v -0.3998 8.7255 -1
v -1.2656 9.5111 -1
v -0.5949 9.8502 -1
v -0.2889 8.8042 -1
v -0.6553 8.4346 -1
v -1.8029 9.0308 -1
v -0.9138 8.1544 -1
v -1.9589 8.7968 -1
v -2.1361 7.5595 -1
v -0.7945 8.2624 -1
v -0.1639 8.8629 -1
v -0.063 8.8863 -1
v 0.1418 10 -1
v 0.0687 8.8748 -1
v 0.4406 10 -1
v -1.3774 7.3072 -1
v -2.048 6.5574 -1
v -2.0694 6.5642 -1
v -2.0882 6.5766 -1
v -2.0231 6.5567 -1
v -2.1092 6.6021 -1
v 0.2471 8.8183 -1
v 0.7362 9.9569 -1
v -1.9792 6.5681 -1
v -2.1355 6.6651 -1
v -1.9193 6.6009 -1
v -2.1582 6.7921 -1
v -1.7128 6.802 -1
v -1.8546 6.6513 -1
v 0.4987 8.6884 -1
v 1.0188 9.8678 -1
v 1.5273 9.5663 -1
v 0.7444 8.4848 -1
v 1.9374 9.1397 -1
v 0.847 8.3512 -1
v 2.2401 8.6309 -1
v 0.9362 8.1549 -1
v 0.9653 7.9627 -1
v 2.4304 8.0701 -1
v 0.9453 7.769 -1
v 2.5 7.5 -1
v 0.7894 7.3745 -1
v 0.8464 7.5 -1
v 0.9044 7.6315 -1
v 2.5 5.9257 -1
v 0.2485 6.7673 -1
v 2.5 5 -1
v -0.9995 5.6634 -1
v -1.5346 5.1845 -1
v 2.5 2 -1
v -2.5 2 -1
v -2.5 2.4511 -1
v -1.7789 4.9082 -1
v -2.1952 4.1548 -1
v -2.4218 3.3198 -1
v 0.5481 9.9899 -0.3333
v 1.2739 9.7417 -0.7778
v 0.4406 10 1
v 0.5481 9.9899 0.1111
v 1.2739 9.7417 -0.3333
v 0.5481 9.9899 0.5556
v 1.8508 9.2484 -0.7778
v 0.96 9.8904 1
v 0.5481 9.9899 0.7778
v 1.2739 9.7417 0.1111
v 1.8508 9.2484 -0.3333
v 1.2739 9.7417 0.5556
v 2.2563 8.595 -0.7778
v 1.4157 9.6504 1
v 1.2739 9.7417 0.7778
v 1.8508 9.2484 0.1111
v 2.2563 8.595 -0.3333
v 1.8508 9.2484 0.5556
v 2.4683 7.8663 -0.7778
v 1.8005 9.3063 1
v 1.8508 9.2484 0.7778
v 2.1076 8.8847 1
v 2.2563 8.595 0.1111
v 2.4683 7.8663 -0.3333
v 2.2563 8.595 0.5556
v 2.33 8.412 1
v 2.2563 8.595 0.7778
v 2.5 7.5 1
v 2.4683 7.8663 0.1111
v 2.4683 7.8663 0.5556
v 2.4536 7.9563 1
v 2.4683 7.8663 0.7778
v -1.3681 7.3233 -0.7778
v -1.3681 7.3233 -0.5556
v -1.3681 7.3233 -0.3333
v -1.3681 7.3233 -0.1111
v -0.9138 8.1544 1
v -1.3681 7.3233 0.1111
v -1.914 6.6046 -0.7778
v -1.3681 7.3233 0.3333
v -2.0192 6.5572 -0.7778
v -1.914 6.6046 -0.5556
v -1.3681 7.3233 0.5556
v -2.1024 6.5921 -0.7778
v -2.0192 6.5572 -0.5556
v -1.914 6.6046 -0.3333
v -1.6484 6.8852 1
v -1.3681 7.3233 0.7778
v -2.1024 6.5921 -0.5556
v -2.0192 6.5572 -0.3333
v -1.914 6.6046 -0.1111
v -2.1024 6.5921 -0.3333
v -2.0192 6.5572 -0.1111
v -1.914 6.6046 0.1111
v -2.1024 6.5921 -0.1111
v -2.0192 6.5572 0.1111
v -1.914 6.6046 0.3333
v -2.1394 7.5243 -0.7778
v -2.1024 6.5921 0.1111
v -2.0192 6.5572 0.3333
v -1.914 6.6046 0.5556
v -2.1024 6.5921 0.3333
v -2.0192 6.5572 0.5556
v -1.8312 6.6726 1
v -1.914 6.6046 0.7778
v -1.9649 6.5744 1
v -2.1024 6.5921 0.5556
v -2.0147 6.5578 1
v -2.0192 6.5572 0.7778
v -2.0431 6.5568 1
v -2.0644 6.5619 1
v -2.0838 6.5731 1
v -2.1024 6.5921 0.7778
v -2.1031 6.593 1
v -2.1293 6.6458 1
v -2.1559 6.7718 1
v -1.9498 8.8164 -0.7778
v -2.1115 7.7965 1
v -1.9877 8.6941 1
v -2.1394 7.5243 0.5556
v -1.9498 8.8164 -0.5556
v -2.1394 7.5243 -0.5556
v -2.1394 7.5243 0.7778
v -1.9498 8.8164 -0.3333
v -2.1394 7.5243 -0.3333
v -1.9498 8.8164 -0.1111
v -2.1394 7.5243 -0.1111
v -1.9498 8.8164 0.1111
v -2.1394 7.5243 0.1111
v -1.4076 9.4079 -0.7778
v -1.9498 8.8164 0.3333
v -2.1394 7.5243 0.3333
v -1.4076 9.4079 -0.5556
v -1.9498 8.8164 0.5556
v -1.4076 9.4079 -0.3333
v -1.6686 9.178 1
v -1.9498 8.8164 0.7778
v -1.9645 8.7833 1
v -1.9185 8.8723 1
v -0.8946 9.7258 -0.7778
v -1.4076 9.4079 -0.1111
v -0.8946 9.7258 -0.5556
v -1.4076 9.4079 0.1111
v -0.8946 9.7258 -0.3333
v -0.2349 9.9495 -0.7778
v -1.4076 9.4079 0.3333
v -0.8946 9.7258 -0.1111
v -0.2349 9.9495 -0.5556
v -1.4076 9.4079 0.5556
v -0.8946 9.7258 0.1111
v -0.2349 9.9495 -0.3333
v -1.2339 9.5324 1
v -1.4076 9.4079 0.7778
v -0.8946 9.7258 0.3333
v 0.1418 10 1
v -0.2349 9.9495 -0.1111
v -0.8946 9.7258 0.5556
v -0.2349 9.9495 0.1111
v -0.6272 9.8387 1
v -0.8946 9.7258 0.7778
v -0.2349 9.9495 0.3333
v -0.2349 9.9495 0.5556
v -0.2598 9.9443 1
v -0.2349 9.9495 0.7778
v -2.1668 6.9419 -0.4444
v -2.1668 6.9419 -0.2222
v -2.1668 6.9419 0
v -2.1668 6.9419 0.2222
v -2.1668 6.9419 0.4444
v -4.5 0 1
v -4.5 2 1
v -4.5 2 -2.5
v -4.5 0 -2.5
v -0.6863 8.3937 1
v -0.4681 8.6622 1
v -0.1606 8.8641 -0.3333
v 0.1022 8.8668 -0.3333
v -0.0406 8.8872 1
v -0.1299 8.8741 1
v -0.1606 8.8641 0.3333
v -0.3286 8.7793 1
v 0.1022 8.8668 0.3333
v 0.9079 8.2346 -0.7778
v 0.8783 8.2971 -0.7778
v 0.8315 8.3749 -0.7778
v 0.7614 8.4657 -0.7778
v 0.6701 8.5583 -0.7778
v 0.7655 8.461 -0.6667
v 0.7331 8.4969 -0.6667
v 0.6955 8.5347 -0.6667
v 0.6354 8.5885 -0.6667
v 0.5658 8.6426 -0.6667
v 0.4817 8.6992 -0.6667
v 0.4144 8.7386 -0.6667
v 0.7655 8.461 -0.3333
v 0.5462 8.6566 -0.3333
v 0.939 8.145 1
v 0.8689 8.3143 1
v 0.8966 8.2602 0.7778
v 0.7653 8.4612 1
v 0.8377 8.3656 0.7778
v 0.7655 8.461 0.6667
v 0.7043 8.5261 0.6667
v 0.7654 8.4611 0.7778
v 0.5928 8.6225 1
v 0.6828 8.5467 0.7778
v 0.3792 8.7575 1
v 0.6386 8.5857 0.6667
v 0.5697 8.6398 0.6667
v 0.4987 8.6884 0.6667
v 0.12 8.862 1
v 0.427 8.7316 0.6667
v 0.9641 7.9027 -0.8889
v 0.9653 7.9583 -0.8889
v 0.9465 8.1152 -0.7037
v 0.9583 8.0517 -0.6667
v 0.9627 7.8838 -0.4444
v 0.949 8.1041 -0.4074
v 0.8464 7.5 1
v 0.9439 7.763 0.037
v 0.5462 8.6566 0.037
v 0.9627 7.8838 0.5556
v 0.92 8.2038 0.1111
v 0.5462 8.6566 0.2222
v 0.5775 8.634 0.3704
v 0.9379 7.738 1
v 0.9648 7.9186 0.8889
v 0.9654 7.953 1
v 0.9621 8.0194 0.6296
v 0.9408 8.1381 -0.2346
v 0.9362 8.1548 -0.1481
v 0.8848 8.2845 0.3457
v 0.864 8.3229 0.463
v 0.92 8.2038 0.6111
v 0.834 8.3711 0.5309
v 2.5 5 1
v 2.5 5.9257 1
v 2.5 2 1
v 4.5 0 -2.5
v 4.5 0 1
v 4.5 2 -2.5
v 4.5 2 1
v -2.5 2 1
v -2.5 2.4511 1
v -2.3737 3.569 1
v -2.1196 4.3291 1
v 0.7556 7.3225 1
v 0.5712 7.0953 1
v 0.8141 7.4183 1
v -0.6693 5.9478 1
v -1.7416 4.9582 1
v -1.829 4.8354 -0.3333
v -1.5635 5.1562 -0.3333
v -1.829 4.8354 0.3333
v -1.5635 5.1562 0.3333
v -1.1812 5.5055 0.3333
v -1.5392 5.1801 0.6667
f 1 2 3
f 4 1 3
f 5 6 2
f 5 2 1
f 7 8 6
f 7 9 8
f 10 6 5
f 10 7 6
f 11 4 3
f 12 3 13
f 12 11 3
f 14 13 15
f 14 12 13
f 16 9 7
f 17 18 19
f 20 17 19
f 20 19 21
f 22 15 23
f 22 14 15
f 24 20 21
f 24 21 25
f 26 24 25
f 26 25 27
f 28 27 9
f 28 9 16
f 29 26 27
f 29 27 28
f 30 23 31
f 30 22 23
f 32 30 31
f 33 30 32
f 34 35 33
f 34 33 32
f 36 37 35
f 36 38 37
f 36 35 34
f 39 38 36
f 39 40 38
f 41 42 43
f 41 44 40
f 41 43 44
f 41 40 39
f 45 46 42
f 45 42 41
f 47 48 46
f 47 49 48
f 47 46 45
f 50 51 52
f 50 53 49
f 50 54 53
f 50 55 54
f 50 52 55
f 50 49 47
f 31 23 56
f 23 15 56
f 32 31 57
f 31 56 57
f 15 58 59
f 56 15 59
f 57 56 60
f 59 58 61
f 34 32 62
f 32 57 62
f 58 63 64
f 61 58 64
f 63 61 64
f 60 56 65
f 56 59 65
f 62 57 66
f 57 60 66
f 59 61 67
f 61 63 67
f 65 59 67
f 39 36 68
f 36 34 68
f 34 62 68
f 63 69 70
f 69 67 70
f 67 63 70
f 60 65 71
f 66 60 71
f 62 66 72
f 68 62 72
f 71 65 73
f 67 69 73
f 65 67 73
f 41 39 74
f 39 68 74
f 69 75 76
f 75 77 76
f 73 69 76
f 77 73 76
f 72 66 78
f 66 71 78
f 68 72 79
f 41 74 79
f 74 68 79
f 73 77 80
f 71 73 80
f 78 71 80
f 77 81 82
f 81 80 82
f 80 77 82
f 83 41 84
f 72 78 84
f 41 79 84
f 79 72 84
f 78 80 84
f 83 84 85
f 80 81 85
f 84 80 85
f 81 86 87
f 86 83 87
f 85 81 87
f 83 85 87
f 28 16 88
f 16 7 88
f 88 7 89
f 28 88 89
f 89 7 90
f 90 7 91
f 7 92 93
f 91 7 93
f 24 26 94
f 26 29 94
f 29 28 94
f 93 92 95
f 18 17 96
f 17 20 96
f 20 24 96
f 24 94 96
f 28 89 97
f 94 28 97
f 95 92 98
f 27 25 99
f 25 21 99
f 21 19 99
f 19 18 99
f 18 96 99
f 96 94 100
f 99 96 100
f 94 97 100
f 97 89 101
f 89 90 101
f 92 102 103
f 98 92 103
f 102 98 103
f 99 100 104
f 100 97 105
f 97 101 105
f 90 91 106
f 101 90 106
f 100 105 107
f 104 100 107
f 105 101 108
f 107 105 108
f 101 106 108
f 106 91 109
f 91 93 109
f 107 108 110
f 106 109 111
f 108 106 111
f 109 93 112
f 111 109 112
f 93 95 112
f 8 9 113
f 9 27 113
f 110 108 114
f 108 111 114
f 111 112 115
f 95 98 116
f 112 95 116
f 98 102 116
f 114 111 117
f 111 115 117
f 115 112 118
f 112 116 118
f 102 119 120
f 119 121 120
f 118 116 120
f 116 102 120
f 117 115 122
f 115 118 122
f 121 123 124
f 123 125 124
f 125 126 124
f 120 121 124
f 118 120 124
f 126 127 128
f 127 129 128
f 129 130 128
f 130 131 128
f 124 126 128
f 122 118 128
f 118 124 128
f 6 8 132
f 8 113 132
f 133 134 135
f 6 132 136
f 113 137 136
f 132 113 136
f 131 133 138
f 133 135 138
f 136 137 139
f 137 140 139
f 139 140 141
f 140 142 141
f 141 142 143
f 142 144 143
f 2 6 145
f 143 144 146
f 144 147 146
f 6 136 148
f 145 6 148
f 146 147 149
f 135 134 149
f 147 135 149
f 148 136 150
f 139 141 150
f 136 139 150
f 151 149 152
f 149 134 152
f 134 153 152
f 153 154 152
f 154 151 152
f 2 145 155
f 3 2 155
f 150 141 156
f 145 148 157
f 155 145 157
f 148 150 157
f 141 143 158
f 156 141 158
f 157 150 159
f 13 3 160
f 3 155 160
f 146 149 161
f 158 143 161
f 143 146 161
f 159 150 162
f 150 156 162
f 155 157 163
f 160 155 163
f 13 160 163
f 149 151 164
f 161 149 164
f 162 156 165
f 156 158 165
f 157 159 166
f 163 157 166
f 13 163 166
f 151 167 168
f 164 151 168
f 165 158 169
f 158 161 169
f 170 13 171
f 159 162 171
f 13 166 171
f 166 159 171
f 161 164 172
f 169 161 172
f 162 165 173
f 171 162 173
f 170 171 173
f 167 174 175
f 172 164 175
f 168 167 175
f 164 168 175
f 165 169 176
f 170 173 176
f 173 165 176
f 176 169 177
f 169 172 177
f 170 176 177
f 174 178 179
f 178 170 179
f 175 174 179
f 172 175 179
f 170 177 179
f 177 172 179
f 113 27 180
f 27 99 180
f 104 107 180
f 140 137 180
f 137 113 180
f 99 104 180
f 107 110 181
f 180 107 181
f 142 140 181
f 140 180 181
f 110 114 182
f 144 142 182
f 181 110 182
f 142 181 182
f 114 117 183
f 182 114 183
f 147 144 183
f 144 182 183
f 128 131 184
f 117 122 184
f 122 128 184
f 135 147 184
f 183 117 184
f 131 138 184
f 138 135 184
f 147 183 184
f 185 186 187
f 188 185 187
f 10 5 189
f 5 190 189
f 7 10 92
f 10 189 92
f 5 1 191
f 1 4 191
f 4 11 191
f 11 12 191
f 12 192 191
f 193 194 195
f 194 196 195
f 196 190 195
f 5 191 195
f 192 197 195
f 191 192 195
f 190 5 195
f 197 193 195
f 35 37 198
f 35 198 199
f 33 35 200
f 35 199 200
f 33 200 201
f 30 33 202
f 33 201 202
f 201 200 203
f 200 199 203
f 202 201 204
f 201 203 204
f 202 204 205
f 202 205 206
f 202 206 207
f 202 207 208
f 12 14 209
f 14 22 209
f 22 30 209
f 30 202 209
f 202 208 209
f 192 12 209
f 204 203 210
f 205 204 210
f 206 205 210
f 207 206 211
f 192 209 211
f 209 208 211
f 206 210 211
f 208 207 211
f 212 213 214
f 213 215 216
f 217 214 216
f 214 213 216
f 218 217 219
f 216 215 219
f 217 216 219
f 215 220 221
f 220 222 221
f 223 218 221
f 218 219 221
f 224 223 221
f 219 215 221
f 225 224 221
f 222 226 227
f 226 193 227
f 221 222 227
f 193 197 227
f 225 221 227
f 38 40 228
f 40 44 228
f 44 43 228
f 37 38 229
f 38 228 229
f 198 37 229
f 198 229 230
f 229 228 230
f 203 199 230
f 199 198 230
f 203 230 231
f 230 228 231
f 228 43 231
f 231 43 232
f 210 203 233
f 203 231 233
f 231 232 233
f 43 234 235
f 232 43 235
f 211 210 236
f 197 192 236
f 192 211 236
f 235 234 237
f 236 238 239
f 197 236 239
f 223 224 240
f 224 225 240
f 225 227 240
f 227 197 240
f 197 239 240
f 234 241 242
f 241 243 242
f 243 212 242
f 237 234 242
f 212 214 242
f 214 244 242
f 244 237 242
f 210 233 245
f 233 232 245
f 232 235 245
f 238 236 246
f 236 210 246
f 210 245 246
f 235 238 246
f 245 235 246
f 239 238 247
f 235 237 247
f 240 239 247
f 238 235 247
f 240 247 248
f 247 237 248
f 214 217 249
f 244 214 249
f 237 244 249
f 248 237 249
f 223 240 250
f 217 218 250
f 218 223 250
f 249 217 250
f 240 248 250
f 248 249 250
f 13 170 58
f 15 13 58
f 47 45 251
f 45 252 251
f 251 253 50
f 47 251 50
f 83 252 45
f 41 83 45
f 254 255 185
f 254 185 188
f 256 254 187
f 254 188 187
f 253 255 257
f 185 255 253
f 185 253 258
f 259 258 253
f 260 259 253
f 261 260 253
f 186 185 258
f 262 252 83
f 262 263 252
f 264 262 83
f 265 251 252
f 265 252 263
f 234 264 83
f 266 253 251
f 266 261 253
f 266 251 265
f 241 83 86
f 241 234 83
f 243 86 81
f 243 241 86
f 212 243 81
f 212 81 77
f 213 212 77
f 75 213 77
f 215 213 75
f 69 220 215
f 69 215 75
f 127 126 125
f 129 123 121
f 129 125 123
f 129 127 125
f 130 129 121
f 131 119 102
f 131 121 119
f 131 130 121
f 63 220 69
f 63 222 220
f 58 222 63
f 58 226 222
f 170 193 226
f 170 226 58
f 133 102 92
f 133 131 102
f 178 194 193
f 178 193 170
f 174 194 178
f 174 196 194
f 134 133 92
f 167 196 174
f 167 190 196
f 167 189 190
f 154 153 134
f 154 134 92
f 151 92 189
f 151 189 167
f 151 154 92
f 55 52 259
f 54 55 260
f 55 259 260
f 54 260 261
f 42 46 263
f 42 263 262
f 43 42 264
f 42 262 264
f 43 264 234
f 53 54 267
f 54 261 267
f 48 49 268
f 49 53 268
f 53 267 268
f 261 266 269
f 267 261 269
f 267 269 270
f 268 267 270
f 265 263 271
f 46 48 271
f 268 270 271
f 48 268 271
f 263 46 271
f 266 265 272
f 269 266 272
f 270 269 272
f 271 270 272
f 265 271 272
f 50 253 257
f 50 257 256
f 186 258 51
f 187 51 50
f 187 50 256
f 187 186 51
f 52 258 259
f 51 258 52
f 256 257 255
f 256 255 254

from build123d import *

# Parameters (mm, degrees)
SKETCH1_W                = 5
SKETCH1_H                = 5
BOSS_EXTRUDE1_DEPTH      = 2
SKETCH2_W                = 5
SKETCH2_H                = 2
BOSS_EXTRUDE2_DEPTH      = 8
SKETCH3_OUTSIDE_W        = 9.45
SKETCH3_OUTSIDE_H        = 14.45
CUT_EXTRUDE2_DEPTH       = 2.5
CUT_EXTRUDE2_DEPTH_BACK  = 4.5
SKETCH4_W                = 3.5
SKETCH4_H                = 2
BOSS_EXTRUDE3_DEPTH      = 2
BOSS_EXTRUDE3_DEPTH_BACK = 7
SKETCH5_W                = 1.5
SKETCH5_H                = 2
CUT_EXTRUDE3_DEPTH       = 8


with BuildPart() as part:
    # Sketch1 → Boss-Extrude1 (new body)
    with BuildSketch(Plane(origin=(0, 0, 0), x_dir=(1, 0, 0), z_dir=(0, 1, 0))):
        Rectangle(SKETCH1_W, SKETCH1_H)
    extrude(amount=BOSS_EXTRUDE1_DEPTH)

    # Sketch2 → Boss-Extrude2 (add)
    with BuildSketch(Plane(origin=(0, 2, 0), x_dir=(1, 0, 0), z_dir=(0, 1, 0))):
        Rectangle(SKETCH2_W, SKETCH2_H)
    extrude(amount=BOSS_EXTRUDE2_DEPTH)

    # Sketch3 outside → Cut-Extrude2 (cut, two sides)
    with BuildSketch(Plane.XY.offset(1)) as cut_extrude2_sk:
        with Locations((0, 5)):
            Rectangle(SKETCH3_OUTSIDE_W, SKETCH3_OUTSIDE_H)
        with BuildLine():
            Line((-2.5, 2), (-2.5, 0))
            Line((-2.5, 0), (2.5, 0))
            Line((2.5, 0), (2.5, 5))
            add(Edge.make_bspline(
                [(-0.913797876, 8.154353357), (-1.140290702, 7.764014656), (-1.655275227, 6.650653781), (-2.325037112, 6.455286198), (-2.005184786, 8.587856331), (-1.950557279, 8.936862033), (-1.049722674, 9.922936438), (1.431279674, 10.104693489), (2.482165571, 8.628994664), (2.518593991, 6.608795973), (2.490077622, 5.781893624), (2.5, 5)],
                knots=[0, 0, 0, 0, 0.166355066, 0.201541651, 0.335163153, 0.374433937, 0.554978708, 0.601657114, 0.794539594, 0.836784913, 1, 1, 1, 1], degree=3))
            add(Edge.make_bspline(
                [(0.846399905, 7.5), (1.269487929, 8.332056459), (0.146387492, 8.943361743), (-0.531494104, 8.784988095), (-0.648759024, 8.347108886), (-0.913797876, 8.154353357)],
                knots=[0, 0, 0, 0, 0.263206517, 0.363206517, 1, 1, 1, 1], degree=3))
            add(Edge.make_bspline(
                [(-2.5, 2), (-2.539795839, 3.63685244), (-2.078163398, 4.489565773), (-1.464924659, 5.353900226), (0.733429791, 7.043753996), (0.846399905, 7.5)],
                knots=[0, 0, 0, 0, 0.510185801, 0.610185801, 1, 1, 1, 1], degree=3))
        make_face(mode=Mode.SUBTRACT)
    extrude(amount=CUT_EXTRUDE2_DEPTH, mode=Mode.SUBTRACT)
    extrude(cut_extrude2_sk.sketch, amount=-CUT_EXTRUDE2_DEPTH_BACK, mode=Mode.SUBTRACT)

    # Sketch4 → Boss-Extrude3 (add, two sides)
    with BuildSketch(Plane(origin=(2.5, 0, 0), x_dir=(0, 0, -1), z_dir=(1, 0, 0))) as boss_extrude3_sk:
        with Locations((0.75, 1)):
            Rectangle(SKETCH4_W, SKETCH4_H)
    extrude(amount=BOSS_EXTRUDE3_DEPTH)
    extrude(boss_extrude3_sk.sketch, amount=-BOSS_EXTRUDE3_DEPTH_BACK)

    # Sketch5 → Cut-Extrude3 (cut, through all)
    with BuildSketch(Plane(origin=(2.5, 0, 0), x_dir=(0, 0, -1), z_dir=(1, 0, 0))):
        with Locations((-1.75, 1)):
            Rectangle(SKETCH5_W, SKETCH5_H)
    extrude(amount=-CUT_EXTRUDE3_DEPTH, mode=Mode.SUBTRACT)


solid = part.part
